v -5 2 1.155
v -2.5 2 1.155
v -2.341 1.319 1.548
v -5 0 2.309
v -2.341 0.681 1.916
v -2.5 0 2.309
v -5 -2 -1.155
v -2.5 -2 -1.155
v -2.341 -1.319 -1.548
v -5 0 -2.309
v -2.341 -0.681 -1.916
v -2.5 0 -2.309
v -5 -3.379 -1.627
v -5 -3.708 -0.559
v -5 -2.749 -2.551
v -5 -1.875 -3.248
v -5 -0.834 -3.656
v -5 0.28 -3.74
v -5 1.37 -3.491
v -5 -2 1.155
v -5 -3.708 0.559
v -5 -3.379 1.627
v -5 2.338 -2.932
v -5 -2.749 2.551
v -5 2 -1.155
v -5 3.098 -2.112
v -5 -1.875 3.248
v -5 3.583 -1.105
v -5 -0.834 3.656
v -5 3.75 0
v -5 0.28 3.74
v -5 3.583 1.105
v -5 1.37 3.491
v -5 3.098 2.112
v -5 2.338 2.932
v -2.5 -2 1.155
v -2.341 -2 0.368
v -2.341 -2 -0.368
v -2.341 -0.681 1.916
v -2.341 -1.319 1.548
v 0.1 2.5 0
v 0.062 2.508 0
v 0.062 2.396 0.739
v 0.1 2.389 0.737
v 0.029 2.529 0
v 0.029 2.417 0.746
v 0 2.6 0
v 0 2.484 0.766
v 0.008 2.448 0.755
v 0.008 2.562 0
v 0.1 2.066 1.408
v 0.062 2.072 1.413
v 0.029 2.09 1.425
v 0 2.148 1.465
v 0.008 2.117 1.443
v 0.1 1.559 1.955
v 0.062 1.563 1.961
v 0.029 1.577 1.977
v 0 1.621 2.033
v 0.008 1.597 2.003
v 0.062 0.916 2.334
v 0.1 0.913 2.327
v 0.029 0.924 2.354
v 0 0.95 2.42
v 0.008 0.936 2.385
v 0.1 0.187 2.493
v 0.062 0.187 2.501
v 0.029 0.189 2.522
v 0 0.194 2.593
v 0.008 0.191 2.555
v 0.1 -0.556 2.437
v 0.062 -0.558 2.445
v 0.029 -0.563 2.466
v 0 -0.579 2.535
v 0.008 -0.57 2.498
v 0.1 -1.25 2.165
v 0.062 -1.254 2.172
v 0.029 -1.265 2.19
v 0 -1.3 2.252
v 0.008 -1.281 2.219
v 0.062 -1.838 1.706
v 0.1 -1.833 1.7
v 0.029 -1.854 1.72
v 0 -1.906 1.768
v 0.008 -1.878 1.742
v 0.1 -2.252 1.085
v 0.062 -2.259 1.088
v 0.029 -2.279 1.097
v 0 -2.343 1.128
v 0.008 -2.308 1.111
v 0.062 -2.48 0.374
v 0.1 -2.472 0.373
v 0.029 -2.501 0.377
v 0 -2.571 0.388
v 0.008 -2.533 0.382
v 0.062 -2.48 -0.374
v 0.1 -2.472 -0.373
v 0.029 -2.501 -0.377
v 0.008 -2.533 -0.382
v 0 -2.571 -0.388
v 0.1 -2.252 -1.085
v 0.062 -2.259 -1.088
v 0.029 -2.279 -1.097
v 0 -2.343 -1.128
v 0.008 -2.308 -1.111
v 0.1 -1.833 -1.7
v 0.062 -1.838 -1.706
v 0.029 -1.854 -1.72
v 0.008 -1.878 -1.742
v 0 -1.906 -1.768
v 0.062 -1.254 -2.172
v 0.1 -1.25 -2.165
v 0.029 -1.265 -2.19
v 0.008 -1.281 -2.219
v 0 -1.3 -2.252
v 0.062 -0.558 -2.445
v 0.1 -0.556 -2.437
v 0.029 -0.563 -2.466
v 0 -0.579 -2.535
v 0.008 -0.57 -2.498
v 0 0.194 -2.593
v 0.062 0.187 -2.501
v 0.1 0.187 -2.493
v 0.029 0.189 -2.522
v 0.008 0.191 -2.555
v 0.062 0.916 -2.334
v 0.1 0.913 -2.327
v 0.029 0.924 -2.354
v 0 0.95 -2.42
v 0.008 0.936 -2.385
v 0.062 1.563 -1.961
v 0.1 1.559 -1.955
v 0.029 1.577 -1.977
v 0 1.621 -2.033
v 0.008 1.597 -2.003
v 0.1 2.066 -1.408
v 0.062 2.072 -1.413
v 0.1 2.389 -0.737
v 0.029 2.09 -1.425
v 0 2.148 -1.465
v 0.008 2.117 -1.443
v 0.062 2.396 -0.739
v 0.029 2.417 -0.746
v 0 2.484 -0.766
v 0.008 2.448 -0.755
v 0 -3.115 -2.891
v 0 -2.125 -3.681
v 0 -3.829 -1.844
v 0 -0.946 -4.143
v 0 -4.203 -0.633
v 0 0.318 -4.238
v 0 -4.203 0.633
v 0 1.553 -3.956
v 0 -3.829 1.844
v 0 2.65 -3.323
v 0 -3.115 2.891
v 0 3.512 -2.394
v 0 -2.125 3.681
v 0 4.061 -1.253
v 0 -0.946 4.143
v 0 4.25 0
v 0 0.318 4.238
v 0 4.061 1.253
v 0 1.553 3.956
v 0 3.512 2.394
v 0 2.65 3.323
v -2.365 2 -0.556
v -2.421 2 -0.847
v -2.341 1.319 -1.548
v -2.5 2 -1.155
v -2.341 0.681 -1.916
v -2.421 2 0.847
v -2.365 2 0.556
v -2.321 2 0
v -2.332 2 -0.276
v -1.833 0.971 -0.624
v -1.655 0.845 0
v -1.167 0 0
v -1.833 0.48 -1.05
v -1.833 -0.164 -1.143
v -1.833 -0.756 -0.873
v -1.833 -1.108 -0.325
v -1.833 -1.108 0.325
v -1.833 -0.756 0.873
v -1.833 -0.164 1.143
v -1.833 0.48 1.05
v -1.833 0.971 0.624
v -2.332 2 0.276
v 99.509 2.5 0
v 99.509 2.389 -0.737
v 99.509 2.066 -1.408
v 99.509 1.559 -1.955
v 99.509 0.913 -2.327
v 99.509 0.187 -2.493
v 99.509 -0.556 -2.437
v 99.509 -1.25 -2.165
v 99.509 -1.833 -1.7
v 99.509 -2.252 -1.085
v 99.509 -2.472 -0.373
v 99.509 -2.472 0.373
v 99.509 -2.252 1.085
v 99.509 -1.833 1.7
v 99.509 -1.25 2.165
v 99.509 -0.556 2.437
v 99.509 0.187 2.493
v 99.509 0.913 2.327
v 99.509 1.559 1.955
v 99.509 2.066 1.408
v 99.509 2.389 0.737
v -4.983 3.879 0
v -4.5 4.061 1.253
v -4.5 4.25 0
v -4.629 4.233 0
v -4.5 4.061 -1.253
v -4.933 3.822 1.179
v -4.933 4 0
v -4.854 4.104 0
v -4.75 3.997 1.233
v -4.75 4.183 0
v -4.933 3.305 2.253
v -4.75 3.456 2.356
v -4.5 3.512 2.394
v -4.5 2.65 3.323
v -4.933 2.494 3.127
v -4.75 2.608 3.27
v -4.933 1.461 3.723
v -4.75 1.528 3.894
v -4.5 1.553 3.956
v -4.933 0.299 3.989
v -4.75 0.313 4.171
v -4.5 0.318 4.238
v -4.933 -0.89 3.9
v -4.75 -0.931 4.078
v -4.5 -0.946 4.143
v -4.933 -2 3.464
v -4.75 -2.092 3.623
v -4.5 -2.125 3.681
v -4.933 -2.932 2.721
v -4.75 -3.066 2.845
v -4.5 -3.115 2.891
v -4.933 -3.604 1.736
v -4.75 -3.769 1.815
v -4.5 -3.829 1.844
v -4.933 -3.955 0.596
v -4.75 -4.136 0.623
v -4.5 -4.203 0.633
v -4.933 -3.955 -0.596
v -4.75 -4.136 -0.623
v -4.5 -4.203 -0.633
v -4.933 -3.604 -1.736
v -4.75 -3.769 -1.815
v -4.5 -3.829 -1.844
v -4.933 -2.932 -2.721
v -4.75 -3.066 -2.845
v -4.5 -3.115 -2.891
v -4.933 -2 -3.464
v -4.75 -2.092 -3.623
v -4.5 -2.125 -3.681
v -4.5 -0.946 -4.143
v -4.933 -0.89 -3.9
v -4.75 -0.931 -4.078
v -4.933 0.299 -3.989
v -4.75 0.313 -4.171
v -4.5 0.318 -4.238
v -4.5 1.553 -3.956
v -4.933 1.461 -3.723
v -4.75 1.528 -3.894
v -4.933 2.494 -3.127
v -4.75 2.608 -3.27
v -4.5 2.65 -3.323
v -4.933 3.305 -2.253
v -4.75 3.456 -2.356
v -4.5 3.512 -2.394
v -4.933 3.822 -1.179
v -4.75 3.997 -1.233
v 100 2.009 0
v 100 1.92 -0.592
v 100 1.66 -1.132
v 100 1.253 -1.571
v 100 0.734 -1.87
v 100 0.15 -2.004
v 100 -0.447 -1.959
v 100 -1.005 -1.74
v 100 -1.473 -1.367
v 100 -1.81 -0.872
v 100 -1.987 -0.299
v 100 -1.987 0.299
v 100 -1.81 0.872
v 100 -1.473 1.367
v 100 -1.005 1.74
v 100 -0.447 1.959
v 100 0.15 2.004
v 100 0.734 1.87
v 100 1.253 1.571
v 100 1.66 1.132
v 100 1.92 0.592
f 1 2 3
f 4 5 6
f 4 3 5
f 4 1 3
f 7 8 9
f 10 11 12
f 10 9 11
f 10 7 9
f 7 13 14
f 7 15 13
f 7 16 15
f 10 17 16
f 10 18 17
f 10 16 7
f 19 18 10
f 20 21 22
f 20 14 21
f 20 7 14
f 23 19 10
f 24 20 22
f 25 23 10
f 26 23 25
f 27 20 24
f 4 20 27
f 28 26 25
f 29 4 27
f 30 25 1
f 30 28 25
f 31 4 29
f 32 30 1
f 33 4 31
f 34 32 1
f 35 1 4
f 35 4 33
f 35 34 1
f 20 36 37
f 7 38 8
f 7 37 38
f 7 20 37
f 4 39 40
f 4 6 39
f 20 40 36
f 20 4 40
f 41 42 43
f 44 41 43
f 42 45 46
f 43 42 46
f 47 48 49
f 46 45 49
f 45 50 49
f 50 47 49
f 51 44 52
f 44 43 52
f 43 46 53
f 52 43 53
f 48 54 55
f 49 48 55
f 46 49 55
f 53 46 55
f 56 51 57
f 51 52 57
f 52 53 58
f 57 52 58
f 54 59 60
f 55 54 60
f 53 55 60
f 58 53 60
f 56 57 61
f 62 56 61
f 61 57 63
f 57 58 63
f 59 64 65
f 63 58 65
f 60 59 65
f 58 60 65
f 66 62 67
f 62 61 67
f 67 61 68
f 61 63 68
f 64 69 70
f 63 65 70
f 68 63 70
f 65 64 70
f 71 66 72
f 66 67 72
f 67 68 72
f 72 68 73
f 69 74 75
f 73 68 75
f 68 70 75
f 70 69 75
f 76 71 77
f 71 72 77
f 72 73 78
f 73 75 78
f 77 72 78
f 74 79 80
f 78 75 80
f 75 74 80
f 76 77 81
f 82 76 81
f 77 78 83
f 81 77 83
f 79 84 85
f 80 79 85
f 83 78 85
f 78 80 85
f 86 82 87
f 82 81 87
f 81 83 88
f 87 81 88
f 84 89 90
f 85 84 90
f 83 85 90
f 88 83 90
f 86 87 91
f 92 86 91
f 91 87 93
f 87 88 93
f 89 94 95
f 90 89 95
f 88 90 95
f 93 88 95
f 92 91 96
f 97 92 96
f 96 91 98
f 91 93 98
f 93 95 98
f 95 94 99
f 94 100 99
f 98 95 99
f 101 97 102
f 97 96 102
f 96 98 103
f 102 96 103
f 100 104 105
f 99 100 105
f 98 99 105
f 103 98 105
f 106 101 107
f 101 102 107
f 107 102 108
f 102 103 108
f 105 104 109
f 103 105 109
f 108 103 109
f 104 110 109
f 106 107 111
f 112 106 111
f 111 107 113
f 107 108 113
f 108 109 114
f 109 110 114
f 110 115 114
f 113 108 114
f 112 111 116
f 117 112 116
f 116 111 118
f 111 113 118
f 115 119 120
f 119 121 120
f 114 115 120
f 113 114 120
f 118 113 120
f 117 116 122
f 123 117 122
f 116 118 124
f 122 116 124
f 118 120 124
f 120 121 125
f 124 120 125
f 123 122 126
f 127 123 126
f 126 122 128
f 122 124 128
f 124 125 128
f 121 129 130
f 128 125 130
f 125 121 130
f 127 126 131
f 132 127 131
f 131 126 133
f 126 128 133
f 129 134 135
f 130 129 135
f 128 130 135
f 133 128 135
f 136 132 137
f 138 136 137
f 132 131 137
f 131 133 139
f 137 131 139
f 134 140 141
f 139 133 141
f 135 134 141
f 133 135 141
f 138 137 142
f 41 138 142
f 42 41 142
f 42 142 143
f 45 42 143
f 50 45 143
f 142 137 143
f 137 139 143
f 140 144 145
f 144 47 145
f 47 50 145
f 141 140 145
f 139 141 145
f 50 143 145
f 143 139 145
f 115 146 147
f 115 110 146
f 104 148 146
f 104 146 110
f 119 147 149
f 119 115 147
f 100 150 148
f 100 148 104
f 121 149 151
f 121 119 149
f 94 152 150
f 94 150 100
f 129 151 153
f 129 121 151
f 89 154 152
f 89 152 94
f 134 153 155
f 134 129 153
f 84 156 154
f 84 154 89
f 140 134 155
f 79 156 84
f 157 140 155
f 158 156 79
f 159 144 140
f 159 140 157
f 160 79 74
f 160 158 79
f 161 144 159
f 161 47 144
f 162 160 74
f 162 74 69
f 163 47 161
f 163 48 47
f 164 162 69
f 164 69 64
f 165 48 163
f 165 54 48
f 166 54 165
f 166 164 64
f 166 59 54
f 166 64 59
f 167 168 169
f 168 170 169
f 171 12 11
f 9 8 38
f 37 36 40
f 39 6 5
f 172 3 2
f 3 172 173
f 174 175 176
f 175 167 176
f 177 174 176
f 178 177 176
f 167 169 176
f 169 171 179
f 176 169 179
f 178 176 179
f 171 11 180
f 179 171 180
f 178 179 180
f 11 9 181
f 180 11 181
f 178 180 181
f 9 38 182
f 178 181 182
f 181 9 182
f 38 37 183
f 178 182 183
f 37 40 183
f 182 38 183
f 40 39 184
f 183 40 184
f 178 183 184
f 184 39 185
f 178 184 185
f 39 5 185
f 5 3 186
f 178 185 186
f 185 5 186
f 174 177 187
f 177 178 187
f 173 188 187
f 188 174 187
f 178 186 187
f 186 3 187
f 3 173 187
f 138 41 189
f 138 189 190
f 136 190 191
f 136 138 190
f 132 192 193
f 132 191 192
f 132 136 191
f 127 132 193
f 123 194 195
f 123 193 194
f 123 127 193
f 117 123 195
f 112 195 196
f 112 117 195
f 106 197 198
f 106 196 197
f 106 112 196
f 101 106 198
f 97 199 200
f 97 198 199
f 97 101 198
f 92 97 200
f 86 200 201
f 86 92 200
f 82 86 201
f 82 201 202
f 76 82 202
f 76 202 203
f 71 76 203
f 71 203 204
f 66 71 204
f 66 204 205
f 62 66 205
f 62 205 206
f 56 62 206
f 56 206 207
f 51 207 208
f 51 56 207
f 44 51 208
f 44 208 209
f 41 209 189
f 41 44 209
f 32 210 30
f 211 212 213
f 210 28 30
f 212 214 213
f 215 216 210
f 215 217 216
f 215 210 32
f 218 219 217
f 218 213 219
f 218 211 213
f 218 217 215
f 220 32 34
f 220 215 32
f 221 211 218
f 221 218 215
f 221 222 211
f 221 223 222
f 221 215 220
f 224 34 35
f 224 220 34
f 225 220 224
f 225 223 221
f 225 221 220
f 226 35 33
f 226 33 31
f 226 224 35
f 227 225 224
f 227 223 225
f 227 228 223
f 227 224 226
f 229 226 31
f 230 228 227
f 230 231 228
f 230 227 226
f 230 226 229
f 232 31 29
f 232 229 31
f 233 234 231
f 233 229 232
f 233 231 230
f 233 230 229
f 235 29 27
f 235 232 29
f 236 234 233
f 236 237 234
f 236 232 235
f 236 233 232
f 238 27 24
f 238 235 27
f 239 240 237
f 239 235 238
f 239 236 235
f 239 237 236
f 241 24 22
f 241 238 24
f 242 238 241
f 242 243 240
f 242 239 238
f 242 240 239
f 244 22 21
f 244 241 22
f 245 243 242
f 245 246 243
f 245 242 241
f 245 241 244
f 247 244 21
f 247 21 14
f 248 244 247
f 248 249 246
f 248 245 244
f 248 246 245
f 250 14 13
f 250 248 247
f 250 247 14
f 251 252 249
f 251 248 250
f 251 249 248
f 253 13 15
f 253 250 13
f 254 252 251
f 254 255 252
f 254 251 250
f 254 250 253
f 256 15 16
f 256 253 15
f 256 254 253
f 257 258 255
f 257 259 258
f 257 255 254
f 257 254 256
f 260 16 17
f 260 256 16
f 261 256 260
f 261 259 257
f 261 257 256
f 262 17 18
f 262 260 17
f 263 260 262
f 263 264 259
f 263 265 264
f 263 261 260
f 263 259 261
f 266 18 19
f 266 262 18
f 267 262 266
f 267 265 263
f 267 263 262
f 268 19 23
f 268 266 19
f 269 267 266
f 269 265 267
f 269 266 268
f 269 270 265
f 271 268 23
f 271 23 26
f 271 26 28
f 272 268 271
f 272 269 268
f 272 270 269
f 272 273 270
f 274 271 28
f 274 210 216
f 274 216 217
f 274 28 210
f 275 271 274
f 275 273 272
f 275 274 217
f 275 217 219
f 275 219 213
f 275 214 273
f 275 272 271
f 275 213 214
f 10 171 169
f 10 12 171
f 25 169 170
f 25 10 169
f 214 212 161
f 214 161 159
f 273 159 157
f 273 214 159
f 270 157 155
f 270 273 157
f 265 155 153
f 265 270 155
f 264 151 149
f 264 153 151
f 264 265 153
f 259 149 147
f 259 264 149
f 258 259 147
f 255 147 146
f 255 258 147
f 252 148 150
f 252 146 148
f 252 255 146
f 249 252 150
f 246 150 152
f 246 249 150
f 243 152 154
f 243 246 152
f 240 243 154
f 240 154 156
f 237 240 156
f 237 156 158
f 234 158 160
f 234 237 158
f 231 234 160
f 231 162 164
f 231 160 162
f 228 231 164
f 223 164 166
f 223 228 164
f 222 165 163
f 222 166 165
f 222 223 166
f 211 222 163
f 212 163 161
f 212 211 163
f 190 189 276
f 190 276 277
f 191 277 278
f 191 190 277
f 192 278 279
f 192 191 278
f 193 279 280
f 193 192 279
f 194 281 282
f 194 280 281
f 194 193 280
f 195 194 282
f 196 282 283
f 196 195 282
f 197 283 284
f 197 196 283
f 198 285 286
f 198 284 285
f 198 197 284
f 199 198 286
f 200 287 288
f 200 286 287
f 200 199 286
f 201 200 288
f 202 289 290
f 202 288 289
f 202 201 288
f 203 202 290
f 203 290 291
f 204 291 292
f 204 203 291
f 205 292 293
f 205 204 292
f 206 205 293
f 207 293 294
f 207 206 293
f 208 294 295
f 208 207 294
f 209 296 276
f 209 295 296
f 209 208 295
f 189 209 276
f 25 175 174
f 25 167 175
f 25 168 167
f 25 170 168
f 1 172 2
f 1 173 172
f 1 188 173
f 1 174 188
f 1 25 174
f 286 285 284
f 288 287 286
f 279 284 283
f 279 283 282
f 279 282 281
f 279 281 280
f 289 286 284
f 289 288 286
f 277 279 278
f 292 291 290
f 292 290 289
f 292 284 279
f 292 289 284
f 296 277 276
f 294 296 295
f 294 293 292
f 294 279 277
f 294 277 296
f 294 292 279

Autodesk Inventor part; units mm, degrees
ref_plane "YZ Plane" through (0, 0, 0) normal (1, 0, 0) x (0, 1, 0)
ref_plane "XZ Plane" through (0, 0, 0) normal (0, 1, 0) x (-1, 0, 0)
sketch "Sketch1" plane through (0, 0, 0) normal (0, 0, 1) x (1, 0, 0)
  line L0 (-1.1667, 0) -> (100, 0)
  line L1 (100, 0) -> (100, 2.5)
  line L2 (100, 2.5) -> (78, 2.5)
  line L3 (78, 2.5) -> (77.5091, 2.5)
  line L4 (77.5091, 2.5) -> (0, 2.5)
  line L5 (0, 2.5) -> (0, 4.25)
  line L6 (0, 4.25) -> (-5, 4.25)
  line L7 (-5, 4.25) -> (-5, 2.3094)
  line L8 (-5, 2.3094) -> (-2.5, 2.3094)
  line L9 (-2.5, 2.3094) -> (-1.1667, 0)
  line L10 (-26, 0) -> (121, 0) projected
  line L11 (0, -0.85) -> (0, 5.1) projected
  line L12 (78, 2.5) -> (0, 2.5) construction
  dimension "d1" = 22
  dimension "d2" = 0.4909
  dimension "d3" = 5
  dimension "d4" = 2.5
  dimension "d5" = 60
  dimension "d6" = 5
  dimension "d7" = 5
  dimension "d8" = 4.6188
  dimension "d9" = 8.5
  dimension "d26" = 100
revolve "Body" add sketch "Sketch1" angle 360 about axis through (-1.1667, 0, 0) along (1, 0, 0)
sketch "Sketch2" plane through (-5, 0, 0) normal (-1, 0, 0) x (0, 0, 1)
  circle A0 centre (0, 0) radius 2.3094 projected
  line L0 (0, -5.95) -> (0, 5.95) projected
  line L1 (-5.95, 0) -> (5.95, 0) projected
  line L2 (2.3094, 0) -> (1.1547, -2)
  line L3 (1.1547, -2) -> (-1.1547, -2)
  line L4 (-1.1547, -2) -> (-2.3094, 0)
  line L5 (-2.3094, 0) -> (-1.1547, 2)
  line L6 (-1.1547, 2) -> (1.1547, 2)
  line L7 (1.1547, 2) -> (2.3094, 0)
extrude "Slot" add sketch "Sketch2" against normal up to next contours L7 A0 | A0 L2 | L6 L0 A0 | A0 L0 L3 | L0 L6 A0 | A0 L3 L0 | L4 A0 | A0 L5
fillet "Fillet1" radius 0.5 1 edges at (-5, -4.25, 0)
thread "Thread" size "M5x0.8" class "6g" standard "ISO Metric profile" length 22
chamfer "Chamfer1" distance 0.4908 distance2 0.4908 1 edges at (100, -2.5, 0) measured on face at (100, 0.2353, -0.3409)
ref_plane "Work Plane1" through (29, 0, 0) normal (0, -1, 0) x (1, 0, 0)
fillet "Fillet2" radius 0.1 1 edges at (0, -2.5, 0)
equation "\"d30\" = R"
equation "\"d17\" = RR"
equation "\"d13\" = GEL"
equation "\"d15\" = -0.5 * SPD + 0.5 * GD"
equation "\"d16\" = GUL"
equation "\"d1\" = GEL"
equation "\"d3\" = KOH"
equation "\"d4\" = INTI"
equation "\"d6\" = GD"
equation "\"d7\" = BDM"
equation "\"d8\" = 1.1547 * SW"
equation "\"d9\" = KOD"
equation "\"d26\" = NLG"
equation "\"GD\" = NND"
equation "\"NLG\" = 100"
equation "\"GEL\" = 22"
equation "\"KOD\" = 8.5"
equation "\"KOH\" = 5"
equation "\"INTI\" = 2.5"
equation "\"GAL\" = 0.61345 * PTC"
equation "\"GUL\" = 0.61345 * PTC"
equation "\"BDM\" = NND"
equation "\"SW\" = 4"
equation "\"RR\" = 0.5"
equation "\"SPD\" = 4.01848"
equation "\"R\" = 0.1"
equation "\"TOA\" = 30deg"
equation "\"THREADDIA\" = 5"
equation "\"PTC\" = 0.8"
equation "\"NND\" = 5"
equation "\"E0\" = 1.155 * SW"
equation "\"GD1\" = THREADDIA - 1.2269 * PTC"
properties part number "ANSI B18.3.1M - M5x0.8 x 100, FSHCSM" material "Steel, Mild"
